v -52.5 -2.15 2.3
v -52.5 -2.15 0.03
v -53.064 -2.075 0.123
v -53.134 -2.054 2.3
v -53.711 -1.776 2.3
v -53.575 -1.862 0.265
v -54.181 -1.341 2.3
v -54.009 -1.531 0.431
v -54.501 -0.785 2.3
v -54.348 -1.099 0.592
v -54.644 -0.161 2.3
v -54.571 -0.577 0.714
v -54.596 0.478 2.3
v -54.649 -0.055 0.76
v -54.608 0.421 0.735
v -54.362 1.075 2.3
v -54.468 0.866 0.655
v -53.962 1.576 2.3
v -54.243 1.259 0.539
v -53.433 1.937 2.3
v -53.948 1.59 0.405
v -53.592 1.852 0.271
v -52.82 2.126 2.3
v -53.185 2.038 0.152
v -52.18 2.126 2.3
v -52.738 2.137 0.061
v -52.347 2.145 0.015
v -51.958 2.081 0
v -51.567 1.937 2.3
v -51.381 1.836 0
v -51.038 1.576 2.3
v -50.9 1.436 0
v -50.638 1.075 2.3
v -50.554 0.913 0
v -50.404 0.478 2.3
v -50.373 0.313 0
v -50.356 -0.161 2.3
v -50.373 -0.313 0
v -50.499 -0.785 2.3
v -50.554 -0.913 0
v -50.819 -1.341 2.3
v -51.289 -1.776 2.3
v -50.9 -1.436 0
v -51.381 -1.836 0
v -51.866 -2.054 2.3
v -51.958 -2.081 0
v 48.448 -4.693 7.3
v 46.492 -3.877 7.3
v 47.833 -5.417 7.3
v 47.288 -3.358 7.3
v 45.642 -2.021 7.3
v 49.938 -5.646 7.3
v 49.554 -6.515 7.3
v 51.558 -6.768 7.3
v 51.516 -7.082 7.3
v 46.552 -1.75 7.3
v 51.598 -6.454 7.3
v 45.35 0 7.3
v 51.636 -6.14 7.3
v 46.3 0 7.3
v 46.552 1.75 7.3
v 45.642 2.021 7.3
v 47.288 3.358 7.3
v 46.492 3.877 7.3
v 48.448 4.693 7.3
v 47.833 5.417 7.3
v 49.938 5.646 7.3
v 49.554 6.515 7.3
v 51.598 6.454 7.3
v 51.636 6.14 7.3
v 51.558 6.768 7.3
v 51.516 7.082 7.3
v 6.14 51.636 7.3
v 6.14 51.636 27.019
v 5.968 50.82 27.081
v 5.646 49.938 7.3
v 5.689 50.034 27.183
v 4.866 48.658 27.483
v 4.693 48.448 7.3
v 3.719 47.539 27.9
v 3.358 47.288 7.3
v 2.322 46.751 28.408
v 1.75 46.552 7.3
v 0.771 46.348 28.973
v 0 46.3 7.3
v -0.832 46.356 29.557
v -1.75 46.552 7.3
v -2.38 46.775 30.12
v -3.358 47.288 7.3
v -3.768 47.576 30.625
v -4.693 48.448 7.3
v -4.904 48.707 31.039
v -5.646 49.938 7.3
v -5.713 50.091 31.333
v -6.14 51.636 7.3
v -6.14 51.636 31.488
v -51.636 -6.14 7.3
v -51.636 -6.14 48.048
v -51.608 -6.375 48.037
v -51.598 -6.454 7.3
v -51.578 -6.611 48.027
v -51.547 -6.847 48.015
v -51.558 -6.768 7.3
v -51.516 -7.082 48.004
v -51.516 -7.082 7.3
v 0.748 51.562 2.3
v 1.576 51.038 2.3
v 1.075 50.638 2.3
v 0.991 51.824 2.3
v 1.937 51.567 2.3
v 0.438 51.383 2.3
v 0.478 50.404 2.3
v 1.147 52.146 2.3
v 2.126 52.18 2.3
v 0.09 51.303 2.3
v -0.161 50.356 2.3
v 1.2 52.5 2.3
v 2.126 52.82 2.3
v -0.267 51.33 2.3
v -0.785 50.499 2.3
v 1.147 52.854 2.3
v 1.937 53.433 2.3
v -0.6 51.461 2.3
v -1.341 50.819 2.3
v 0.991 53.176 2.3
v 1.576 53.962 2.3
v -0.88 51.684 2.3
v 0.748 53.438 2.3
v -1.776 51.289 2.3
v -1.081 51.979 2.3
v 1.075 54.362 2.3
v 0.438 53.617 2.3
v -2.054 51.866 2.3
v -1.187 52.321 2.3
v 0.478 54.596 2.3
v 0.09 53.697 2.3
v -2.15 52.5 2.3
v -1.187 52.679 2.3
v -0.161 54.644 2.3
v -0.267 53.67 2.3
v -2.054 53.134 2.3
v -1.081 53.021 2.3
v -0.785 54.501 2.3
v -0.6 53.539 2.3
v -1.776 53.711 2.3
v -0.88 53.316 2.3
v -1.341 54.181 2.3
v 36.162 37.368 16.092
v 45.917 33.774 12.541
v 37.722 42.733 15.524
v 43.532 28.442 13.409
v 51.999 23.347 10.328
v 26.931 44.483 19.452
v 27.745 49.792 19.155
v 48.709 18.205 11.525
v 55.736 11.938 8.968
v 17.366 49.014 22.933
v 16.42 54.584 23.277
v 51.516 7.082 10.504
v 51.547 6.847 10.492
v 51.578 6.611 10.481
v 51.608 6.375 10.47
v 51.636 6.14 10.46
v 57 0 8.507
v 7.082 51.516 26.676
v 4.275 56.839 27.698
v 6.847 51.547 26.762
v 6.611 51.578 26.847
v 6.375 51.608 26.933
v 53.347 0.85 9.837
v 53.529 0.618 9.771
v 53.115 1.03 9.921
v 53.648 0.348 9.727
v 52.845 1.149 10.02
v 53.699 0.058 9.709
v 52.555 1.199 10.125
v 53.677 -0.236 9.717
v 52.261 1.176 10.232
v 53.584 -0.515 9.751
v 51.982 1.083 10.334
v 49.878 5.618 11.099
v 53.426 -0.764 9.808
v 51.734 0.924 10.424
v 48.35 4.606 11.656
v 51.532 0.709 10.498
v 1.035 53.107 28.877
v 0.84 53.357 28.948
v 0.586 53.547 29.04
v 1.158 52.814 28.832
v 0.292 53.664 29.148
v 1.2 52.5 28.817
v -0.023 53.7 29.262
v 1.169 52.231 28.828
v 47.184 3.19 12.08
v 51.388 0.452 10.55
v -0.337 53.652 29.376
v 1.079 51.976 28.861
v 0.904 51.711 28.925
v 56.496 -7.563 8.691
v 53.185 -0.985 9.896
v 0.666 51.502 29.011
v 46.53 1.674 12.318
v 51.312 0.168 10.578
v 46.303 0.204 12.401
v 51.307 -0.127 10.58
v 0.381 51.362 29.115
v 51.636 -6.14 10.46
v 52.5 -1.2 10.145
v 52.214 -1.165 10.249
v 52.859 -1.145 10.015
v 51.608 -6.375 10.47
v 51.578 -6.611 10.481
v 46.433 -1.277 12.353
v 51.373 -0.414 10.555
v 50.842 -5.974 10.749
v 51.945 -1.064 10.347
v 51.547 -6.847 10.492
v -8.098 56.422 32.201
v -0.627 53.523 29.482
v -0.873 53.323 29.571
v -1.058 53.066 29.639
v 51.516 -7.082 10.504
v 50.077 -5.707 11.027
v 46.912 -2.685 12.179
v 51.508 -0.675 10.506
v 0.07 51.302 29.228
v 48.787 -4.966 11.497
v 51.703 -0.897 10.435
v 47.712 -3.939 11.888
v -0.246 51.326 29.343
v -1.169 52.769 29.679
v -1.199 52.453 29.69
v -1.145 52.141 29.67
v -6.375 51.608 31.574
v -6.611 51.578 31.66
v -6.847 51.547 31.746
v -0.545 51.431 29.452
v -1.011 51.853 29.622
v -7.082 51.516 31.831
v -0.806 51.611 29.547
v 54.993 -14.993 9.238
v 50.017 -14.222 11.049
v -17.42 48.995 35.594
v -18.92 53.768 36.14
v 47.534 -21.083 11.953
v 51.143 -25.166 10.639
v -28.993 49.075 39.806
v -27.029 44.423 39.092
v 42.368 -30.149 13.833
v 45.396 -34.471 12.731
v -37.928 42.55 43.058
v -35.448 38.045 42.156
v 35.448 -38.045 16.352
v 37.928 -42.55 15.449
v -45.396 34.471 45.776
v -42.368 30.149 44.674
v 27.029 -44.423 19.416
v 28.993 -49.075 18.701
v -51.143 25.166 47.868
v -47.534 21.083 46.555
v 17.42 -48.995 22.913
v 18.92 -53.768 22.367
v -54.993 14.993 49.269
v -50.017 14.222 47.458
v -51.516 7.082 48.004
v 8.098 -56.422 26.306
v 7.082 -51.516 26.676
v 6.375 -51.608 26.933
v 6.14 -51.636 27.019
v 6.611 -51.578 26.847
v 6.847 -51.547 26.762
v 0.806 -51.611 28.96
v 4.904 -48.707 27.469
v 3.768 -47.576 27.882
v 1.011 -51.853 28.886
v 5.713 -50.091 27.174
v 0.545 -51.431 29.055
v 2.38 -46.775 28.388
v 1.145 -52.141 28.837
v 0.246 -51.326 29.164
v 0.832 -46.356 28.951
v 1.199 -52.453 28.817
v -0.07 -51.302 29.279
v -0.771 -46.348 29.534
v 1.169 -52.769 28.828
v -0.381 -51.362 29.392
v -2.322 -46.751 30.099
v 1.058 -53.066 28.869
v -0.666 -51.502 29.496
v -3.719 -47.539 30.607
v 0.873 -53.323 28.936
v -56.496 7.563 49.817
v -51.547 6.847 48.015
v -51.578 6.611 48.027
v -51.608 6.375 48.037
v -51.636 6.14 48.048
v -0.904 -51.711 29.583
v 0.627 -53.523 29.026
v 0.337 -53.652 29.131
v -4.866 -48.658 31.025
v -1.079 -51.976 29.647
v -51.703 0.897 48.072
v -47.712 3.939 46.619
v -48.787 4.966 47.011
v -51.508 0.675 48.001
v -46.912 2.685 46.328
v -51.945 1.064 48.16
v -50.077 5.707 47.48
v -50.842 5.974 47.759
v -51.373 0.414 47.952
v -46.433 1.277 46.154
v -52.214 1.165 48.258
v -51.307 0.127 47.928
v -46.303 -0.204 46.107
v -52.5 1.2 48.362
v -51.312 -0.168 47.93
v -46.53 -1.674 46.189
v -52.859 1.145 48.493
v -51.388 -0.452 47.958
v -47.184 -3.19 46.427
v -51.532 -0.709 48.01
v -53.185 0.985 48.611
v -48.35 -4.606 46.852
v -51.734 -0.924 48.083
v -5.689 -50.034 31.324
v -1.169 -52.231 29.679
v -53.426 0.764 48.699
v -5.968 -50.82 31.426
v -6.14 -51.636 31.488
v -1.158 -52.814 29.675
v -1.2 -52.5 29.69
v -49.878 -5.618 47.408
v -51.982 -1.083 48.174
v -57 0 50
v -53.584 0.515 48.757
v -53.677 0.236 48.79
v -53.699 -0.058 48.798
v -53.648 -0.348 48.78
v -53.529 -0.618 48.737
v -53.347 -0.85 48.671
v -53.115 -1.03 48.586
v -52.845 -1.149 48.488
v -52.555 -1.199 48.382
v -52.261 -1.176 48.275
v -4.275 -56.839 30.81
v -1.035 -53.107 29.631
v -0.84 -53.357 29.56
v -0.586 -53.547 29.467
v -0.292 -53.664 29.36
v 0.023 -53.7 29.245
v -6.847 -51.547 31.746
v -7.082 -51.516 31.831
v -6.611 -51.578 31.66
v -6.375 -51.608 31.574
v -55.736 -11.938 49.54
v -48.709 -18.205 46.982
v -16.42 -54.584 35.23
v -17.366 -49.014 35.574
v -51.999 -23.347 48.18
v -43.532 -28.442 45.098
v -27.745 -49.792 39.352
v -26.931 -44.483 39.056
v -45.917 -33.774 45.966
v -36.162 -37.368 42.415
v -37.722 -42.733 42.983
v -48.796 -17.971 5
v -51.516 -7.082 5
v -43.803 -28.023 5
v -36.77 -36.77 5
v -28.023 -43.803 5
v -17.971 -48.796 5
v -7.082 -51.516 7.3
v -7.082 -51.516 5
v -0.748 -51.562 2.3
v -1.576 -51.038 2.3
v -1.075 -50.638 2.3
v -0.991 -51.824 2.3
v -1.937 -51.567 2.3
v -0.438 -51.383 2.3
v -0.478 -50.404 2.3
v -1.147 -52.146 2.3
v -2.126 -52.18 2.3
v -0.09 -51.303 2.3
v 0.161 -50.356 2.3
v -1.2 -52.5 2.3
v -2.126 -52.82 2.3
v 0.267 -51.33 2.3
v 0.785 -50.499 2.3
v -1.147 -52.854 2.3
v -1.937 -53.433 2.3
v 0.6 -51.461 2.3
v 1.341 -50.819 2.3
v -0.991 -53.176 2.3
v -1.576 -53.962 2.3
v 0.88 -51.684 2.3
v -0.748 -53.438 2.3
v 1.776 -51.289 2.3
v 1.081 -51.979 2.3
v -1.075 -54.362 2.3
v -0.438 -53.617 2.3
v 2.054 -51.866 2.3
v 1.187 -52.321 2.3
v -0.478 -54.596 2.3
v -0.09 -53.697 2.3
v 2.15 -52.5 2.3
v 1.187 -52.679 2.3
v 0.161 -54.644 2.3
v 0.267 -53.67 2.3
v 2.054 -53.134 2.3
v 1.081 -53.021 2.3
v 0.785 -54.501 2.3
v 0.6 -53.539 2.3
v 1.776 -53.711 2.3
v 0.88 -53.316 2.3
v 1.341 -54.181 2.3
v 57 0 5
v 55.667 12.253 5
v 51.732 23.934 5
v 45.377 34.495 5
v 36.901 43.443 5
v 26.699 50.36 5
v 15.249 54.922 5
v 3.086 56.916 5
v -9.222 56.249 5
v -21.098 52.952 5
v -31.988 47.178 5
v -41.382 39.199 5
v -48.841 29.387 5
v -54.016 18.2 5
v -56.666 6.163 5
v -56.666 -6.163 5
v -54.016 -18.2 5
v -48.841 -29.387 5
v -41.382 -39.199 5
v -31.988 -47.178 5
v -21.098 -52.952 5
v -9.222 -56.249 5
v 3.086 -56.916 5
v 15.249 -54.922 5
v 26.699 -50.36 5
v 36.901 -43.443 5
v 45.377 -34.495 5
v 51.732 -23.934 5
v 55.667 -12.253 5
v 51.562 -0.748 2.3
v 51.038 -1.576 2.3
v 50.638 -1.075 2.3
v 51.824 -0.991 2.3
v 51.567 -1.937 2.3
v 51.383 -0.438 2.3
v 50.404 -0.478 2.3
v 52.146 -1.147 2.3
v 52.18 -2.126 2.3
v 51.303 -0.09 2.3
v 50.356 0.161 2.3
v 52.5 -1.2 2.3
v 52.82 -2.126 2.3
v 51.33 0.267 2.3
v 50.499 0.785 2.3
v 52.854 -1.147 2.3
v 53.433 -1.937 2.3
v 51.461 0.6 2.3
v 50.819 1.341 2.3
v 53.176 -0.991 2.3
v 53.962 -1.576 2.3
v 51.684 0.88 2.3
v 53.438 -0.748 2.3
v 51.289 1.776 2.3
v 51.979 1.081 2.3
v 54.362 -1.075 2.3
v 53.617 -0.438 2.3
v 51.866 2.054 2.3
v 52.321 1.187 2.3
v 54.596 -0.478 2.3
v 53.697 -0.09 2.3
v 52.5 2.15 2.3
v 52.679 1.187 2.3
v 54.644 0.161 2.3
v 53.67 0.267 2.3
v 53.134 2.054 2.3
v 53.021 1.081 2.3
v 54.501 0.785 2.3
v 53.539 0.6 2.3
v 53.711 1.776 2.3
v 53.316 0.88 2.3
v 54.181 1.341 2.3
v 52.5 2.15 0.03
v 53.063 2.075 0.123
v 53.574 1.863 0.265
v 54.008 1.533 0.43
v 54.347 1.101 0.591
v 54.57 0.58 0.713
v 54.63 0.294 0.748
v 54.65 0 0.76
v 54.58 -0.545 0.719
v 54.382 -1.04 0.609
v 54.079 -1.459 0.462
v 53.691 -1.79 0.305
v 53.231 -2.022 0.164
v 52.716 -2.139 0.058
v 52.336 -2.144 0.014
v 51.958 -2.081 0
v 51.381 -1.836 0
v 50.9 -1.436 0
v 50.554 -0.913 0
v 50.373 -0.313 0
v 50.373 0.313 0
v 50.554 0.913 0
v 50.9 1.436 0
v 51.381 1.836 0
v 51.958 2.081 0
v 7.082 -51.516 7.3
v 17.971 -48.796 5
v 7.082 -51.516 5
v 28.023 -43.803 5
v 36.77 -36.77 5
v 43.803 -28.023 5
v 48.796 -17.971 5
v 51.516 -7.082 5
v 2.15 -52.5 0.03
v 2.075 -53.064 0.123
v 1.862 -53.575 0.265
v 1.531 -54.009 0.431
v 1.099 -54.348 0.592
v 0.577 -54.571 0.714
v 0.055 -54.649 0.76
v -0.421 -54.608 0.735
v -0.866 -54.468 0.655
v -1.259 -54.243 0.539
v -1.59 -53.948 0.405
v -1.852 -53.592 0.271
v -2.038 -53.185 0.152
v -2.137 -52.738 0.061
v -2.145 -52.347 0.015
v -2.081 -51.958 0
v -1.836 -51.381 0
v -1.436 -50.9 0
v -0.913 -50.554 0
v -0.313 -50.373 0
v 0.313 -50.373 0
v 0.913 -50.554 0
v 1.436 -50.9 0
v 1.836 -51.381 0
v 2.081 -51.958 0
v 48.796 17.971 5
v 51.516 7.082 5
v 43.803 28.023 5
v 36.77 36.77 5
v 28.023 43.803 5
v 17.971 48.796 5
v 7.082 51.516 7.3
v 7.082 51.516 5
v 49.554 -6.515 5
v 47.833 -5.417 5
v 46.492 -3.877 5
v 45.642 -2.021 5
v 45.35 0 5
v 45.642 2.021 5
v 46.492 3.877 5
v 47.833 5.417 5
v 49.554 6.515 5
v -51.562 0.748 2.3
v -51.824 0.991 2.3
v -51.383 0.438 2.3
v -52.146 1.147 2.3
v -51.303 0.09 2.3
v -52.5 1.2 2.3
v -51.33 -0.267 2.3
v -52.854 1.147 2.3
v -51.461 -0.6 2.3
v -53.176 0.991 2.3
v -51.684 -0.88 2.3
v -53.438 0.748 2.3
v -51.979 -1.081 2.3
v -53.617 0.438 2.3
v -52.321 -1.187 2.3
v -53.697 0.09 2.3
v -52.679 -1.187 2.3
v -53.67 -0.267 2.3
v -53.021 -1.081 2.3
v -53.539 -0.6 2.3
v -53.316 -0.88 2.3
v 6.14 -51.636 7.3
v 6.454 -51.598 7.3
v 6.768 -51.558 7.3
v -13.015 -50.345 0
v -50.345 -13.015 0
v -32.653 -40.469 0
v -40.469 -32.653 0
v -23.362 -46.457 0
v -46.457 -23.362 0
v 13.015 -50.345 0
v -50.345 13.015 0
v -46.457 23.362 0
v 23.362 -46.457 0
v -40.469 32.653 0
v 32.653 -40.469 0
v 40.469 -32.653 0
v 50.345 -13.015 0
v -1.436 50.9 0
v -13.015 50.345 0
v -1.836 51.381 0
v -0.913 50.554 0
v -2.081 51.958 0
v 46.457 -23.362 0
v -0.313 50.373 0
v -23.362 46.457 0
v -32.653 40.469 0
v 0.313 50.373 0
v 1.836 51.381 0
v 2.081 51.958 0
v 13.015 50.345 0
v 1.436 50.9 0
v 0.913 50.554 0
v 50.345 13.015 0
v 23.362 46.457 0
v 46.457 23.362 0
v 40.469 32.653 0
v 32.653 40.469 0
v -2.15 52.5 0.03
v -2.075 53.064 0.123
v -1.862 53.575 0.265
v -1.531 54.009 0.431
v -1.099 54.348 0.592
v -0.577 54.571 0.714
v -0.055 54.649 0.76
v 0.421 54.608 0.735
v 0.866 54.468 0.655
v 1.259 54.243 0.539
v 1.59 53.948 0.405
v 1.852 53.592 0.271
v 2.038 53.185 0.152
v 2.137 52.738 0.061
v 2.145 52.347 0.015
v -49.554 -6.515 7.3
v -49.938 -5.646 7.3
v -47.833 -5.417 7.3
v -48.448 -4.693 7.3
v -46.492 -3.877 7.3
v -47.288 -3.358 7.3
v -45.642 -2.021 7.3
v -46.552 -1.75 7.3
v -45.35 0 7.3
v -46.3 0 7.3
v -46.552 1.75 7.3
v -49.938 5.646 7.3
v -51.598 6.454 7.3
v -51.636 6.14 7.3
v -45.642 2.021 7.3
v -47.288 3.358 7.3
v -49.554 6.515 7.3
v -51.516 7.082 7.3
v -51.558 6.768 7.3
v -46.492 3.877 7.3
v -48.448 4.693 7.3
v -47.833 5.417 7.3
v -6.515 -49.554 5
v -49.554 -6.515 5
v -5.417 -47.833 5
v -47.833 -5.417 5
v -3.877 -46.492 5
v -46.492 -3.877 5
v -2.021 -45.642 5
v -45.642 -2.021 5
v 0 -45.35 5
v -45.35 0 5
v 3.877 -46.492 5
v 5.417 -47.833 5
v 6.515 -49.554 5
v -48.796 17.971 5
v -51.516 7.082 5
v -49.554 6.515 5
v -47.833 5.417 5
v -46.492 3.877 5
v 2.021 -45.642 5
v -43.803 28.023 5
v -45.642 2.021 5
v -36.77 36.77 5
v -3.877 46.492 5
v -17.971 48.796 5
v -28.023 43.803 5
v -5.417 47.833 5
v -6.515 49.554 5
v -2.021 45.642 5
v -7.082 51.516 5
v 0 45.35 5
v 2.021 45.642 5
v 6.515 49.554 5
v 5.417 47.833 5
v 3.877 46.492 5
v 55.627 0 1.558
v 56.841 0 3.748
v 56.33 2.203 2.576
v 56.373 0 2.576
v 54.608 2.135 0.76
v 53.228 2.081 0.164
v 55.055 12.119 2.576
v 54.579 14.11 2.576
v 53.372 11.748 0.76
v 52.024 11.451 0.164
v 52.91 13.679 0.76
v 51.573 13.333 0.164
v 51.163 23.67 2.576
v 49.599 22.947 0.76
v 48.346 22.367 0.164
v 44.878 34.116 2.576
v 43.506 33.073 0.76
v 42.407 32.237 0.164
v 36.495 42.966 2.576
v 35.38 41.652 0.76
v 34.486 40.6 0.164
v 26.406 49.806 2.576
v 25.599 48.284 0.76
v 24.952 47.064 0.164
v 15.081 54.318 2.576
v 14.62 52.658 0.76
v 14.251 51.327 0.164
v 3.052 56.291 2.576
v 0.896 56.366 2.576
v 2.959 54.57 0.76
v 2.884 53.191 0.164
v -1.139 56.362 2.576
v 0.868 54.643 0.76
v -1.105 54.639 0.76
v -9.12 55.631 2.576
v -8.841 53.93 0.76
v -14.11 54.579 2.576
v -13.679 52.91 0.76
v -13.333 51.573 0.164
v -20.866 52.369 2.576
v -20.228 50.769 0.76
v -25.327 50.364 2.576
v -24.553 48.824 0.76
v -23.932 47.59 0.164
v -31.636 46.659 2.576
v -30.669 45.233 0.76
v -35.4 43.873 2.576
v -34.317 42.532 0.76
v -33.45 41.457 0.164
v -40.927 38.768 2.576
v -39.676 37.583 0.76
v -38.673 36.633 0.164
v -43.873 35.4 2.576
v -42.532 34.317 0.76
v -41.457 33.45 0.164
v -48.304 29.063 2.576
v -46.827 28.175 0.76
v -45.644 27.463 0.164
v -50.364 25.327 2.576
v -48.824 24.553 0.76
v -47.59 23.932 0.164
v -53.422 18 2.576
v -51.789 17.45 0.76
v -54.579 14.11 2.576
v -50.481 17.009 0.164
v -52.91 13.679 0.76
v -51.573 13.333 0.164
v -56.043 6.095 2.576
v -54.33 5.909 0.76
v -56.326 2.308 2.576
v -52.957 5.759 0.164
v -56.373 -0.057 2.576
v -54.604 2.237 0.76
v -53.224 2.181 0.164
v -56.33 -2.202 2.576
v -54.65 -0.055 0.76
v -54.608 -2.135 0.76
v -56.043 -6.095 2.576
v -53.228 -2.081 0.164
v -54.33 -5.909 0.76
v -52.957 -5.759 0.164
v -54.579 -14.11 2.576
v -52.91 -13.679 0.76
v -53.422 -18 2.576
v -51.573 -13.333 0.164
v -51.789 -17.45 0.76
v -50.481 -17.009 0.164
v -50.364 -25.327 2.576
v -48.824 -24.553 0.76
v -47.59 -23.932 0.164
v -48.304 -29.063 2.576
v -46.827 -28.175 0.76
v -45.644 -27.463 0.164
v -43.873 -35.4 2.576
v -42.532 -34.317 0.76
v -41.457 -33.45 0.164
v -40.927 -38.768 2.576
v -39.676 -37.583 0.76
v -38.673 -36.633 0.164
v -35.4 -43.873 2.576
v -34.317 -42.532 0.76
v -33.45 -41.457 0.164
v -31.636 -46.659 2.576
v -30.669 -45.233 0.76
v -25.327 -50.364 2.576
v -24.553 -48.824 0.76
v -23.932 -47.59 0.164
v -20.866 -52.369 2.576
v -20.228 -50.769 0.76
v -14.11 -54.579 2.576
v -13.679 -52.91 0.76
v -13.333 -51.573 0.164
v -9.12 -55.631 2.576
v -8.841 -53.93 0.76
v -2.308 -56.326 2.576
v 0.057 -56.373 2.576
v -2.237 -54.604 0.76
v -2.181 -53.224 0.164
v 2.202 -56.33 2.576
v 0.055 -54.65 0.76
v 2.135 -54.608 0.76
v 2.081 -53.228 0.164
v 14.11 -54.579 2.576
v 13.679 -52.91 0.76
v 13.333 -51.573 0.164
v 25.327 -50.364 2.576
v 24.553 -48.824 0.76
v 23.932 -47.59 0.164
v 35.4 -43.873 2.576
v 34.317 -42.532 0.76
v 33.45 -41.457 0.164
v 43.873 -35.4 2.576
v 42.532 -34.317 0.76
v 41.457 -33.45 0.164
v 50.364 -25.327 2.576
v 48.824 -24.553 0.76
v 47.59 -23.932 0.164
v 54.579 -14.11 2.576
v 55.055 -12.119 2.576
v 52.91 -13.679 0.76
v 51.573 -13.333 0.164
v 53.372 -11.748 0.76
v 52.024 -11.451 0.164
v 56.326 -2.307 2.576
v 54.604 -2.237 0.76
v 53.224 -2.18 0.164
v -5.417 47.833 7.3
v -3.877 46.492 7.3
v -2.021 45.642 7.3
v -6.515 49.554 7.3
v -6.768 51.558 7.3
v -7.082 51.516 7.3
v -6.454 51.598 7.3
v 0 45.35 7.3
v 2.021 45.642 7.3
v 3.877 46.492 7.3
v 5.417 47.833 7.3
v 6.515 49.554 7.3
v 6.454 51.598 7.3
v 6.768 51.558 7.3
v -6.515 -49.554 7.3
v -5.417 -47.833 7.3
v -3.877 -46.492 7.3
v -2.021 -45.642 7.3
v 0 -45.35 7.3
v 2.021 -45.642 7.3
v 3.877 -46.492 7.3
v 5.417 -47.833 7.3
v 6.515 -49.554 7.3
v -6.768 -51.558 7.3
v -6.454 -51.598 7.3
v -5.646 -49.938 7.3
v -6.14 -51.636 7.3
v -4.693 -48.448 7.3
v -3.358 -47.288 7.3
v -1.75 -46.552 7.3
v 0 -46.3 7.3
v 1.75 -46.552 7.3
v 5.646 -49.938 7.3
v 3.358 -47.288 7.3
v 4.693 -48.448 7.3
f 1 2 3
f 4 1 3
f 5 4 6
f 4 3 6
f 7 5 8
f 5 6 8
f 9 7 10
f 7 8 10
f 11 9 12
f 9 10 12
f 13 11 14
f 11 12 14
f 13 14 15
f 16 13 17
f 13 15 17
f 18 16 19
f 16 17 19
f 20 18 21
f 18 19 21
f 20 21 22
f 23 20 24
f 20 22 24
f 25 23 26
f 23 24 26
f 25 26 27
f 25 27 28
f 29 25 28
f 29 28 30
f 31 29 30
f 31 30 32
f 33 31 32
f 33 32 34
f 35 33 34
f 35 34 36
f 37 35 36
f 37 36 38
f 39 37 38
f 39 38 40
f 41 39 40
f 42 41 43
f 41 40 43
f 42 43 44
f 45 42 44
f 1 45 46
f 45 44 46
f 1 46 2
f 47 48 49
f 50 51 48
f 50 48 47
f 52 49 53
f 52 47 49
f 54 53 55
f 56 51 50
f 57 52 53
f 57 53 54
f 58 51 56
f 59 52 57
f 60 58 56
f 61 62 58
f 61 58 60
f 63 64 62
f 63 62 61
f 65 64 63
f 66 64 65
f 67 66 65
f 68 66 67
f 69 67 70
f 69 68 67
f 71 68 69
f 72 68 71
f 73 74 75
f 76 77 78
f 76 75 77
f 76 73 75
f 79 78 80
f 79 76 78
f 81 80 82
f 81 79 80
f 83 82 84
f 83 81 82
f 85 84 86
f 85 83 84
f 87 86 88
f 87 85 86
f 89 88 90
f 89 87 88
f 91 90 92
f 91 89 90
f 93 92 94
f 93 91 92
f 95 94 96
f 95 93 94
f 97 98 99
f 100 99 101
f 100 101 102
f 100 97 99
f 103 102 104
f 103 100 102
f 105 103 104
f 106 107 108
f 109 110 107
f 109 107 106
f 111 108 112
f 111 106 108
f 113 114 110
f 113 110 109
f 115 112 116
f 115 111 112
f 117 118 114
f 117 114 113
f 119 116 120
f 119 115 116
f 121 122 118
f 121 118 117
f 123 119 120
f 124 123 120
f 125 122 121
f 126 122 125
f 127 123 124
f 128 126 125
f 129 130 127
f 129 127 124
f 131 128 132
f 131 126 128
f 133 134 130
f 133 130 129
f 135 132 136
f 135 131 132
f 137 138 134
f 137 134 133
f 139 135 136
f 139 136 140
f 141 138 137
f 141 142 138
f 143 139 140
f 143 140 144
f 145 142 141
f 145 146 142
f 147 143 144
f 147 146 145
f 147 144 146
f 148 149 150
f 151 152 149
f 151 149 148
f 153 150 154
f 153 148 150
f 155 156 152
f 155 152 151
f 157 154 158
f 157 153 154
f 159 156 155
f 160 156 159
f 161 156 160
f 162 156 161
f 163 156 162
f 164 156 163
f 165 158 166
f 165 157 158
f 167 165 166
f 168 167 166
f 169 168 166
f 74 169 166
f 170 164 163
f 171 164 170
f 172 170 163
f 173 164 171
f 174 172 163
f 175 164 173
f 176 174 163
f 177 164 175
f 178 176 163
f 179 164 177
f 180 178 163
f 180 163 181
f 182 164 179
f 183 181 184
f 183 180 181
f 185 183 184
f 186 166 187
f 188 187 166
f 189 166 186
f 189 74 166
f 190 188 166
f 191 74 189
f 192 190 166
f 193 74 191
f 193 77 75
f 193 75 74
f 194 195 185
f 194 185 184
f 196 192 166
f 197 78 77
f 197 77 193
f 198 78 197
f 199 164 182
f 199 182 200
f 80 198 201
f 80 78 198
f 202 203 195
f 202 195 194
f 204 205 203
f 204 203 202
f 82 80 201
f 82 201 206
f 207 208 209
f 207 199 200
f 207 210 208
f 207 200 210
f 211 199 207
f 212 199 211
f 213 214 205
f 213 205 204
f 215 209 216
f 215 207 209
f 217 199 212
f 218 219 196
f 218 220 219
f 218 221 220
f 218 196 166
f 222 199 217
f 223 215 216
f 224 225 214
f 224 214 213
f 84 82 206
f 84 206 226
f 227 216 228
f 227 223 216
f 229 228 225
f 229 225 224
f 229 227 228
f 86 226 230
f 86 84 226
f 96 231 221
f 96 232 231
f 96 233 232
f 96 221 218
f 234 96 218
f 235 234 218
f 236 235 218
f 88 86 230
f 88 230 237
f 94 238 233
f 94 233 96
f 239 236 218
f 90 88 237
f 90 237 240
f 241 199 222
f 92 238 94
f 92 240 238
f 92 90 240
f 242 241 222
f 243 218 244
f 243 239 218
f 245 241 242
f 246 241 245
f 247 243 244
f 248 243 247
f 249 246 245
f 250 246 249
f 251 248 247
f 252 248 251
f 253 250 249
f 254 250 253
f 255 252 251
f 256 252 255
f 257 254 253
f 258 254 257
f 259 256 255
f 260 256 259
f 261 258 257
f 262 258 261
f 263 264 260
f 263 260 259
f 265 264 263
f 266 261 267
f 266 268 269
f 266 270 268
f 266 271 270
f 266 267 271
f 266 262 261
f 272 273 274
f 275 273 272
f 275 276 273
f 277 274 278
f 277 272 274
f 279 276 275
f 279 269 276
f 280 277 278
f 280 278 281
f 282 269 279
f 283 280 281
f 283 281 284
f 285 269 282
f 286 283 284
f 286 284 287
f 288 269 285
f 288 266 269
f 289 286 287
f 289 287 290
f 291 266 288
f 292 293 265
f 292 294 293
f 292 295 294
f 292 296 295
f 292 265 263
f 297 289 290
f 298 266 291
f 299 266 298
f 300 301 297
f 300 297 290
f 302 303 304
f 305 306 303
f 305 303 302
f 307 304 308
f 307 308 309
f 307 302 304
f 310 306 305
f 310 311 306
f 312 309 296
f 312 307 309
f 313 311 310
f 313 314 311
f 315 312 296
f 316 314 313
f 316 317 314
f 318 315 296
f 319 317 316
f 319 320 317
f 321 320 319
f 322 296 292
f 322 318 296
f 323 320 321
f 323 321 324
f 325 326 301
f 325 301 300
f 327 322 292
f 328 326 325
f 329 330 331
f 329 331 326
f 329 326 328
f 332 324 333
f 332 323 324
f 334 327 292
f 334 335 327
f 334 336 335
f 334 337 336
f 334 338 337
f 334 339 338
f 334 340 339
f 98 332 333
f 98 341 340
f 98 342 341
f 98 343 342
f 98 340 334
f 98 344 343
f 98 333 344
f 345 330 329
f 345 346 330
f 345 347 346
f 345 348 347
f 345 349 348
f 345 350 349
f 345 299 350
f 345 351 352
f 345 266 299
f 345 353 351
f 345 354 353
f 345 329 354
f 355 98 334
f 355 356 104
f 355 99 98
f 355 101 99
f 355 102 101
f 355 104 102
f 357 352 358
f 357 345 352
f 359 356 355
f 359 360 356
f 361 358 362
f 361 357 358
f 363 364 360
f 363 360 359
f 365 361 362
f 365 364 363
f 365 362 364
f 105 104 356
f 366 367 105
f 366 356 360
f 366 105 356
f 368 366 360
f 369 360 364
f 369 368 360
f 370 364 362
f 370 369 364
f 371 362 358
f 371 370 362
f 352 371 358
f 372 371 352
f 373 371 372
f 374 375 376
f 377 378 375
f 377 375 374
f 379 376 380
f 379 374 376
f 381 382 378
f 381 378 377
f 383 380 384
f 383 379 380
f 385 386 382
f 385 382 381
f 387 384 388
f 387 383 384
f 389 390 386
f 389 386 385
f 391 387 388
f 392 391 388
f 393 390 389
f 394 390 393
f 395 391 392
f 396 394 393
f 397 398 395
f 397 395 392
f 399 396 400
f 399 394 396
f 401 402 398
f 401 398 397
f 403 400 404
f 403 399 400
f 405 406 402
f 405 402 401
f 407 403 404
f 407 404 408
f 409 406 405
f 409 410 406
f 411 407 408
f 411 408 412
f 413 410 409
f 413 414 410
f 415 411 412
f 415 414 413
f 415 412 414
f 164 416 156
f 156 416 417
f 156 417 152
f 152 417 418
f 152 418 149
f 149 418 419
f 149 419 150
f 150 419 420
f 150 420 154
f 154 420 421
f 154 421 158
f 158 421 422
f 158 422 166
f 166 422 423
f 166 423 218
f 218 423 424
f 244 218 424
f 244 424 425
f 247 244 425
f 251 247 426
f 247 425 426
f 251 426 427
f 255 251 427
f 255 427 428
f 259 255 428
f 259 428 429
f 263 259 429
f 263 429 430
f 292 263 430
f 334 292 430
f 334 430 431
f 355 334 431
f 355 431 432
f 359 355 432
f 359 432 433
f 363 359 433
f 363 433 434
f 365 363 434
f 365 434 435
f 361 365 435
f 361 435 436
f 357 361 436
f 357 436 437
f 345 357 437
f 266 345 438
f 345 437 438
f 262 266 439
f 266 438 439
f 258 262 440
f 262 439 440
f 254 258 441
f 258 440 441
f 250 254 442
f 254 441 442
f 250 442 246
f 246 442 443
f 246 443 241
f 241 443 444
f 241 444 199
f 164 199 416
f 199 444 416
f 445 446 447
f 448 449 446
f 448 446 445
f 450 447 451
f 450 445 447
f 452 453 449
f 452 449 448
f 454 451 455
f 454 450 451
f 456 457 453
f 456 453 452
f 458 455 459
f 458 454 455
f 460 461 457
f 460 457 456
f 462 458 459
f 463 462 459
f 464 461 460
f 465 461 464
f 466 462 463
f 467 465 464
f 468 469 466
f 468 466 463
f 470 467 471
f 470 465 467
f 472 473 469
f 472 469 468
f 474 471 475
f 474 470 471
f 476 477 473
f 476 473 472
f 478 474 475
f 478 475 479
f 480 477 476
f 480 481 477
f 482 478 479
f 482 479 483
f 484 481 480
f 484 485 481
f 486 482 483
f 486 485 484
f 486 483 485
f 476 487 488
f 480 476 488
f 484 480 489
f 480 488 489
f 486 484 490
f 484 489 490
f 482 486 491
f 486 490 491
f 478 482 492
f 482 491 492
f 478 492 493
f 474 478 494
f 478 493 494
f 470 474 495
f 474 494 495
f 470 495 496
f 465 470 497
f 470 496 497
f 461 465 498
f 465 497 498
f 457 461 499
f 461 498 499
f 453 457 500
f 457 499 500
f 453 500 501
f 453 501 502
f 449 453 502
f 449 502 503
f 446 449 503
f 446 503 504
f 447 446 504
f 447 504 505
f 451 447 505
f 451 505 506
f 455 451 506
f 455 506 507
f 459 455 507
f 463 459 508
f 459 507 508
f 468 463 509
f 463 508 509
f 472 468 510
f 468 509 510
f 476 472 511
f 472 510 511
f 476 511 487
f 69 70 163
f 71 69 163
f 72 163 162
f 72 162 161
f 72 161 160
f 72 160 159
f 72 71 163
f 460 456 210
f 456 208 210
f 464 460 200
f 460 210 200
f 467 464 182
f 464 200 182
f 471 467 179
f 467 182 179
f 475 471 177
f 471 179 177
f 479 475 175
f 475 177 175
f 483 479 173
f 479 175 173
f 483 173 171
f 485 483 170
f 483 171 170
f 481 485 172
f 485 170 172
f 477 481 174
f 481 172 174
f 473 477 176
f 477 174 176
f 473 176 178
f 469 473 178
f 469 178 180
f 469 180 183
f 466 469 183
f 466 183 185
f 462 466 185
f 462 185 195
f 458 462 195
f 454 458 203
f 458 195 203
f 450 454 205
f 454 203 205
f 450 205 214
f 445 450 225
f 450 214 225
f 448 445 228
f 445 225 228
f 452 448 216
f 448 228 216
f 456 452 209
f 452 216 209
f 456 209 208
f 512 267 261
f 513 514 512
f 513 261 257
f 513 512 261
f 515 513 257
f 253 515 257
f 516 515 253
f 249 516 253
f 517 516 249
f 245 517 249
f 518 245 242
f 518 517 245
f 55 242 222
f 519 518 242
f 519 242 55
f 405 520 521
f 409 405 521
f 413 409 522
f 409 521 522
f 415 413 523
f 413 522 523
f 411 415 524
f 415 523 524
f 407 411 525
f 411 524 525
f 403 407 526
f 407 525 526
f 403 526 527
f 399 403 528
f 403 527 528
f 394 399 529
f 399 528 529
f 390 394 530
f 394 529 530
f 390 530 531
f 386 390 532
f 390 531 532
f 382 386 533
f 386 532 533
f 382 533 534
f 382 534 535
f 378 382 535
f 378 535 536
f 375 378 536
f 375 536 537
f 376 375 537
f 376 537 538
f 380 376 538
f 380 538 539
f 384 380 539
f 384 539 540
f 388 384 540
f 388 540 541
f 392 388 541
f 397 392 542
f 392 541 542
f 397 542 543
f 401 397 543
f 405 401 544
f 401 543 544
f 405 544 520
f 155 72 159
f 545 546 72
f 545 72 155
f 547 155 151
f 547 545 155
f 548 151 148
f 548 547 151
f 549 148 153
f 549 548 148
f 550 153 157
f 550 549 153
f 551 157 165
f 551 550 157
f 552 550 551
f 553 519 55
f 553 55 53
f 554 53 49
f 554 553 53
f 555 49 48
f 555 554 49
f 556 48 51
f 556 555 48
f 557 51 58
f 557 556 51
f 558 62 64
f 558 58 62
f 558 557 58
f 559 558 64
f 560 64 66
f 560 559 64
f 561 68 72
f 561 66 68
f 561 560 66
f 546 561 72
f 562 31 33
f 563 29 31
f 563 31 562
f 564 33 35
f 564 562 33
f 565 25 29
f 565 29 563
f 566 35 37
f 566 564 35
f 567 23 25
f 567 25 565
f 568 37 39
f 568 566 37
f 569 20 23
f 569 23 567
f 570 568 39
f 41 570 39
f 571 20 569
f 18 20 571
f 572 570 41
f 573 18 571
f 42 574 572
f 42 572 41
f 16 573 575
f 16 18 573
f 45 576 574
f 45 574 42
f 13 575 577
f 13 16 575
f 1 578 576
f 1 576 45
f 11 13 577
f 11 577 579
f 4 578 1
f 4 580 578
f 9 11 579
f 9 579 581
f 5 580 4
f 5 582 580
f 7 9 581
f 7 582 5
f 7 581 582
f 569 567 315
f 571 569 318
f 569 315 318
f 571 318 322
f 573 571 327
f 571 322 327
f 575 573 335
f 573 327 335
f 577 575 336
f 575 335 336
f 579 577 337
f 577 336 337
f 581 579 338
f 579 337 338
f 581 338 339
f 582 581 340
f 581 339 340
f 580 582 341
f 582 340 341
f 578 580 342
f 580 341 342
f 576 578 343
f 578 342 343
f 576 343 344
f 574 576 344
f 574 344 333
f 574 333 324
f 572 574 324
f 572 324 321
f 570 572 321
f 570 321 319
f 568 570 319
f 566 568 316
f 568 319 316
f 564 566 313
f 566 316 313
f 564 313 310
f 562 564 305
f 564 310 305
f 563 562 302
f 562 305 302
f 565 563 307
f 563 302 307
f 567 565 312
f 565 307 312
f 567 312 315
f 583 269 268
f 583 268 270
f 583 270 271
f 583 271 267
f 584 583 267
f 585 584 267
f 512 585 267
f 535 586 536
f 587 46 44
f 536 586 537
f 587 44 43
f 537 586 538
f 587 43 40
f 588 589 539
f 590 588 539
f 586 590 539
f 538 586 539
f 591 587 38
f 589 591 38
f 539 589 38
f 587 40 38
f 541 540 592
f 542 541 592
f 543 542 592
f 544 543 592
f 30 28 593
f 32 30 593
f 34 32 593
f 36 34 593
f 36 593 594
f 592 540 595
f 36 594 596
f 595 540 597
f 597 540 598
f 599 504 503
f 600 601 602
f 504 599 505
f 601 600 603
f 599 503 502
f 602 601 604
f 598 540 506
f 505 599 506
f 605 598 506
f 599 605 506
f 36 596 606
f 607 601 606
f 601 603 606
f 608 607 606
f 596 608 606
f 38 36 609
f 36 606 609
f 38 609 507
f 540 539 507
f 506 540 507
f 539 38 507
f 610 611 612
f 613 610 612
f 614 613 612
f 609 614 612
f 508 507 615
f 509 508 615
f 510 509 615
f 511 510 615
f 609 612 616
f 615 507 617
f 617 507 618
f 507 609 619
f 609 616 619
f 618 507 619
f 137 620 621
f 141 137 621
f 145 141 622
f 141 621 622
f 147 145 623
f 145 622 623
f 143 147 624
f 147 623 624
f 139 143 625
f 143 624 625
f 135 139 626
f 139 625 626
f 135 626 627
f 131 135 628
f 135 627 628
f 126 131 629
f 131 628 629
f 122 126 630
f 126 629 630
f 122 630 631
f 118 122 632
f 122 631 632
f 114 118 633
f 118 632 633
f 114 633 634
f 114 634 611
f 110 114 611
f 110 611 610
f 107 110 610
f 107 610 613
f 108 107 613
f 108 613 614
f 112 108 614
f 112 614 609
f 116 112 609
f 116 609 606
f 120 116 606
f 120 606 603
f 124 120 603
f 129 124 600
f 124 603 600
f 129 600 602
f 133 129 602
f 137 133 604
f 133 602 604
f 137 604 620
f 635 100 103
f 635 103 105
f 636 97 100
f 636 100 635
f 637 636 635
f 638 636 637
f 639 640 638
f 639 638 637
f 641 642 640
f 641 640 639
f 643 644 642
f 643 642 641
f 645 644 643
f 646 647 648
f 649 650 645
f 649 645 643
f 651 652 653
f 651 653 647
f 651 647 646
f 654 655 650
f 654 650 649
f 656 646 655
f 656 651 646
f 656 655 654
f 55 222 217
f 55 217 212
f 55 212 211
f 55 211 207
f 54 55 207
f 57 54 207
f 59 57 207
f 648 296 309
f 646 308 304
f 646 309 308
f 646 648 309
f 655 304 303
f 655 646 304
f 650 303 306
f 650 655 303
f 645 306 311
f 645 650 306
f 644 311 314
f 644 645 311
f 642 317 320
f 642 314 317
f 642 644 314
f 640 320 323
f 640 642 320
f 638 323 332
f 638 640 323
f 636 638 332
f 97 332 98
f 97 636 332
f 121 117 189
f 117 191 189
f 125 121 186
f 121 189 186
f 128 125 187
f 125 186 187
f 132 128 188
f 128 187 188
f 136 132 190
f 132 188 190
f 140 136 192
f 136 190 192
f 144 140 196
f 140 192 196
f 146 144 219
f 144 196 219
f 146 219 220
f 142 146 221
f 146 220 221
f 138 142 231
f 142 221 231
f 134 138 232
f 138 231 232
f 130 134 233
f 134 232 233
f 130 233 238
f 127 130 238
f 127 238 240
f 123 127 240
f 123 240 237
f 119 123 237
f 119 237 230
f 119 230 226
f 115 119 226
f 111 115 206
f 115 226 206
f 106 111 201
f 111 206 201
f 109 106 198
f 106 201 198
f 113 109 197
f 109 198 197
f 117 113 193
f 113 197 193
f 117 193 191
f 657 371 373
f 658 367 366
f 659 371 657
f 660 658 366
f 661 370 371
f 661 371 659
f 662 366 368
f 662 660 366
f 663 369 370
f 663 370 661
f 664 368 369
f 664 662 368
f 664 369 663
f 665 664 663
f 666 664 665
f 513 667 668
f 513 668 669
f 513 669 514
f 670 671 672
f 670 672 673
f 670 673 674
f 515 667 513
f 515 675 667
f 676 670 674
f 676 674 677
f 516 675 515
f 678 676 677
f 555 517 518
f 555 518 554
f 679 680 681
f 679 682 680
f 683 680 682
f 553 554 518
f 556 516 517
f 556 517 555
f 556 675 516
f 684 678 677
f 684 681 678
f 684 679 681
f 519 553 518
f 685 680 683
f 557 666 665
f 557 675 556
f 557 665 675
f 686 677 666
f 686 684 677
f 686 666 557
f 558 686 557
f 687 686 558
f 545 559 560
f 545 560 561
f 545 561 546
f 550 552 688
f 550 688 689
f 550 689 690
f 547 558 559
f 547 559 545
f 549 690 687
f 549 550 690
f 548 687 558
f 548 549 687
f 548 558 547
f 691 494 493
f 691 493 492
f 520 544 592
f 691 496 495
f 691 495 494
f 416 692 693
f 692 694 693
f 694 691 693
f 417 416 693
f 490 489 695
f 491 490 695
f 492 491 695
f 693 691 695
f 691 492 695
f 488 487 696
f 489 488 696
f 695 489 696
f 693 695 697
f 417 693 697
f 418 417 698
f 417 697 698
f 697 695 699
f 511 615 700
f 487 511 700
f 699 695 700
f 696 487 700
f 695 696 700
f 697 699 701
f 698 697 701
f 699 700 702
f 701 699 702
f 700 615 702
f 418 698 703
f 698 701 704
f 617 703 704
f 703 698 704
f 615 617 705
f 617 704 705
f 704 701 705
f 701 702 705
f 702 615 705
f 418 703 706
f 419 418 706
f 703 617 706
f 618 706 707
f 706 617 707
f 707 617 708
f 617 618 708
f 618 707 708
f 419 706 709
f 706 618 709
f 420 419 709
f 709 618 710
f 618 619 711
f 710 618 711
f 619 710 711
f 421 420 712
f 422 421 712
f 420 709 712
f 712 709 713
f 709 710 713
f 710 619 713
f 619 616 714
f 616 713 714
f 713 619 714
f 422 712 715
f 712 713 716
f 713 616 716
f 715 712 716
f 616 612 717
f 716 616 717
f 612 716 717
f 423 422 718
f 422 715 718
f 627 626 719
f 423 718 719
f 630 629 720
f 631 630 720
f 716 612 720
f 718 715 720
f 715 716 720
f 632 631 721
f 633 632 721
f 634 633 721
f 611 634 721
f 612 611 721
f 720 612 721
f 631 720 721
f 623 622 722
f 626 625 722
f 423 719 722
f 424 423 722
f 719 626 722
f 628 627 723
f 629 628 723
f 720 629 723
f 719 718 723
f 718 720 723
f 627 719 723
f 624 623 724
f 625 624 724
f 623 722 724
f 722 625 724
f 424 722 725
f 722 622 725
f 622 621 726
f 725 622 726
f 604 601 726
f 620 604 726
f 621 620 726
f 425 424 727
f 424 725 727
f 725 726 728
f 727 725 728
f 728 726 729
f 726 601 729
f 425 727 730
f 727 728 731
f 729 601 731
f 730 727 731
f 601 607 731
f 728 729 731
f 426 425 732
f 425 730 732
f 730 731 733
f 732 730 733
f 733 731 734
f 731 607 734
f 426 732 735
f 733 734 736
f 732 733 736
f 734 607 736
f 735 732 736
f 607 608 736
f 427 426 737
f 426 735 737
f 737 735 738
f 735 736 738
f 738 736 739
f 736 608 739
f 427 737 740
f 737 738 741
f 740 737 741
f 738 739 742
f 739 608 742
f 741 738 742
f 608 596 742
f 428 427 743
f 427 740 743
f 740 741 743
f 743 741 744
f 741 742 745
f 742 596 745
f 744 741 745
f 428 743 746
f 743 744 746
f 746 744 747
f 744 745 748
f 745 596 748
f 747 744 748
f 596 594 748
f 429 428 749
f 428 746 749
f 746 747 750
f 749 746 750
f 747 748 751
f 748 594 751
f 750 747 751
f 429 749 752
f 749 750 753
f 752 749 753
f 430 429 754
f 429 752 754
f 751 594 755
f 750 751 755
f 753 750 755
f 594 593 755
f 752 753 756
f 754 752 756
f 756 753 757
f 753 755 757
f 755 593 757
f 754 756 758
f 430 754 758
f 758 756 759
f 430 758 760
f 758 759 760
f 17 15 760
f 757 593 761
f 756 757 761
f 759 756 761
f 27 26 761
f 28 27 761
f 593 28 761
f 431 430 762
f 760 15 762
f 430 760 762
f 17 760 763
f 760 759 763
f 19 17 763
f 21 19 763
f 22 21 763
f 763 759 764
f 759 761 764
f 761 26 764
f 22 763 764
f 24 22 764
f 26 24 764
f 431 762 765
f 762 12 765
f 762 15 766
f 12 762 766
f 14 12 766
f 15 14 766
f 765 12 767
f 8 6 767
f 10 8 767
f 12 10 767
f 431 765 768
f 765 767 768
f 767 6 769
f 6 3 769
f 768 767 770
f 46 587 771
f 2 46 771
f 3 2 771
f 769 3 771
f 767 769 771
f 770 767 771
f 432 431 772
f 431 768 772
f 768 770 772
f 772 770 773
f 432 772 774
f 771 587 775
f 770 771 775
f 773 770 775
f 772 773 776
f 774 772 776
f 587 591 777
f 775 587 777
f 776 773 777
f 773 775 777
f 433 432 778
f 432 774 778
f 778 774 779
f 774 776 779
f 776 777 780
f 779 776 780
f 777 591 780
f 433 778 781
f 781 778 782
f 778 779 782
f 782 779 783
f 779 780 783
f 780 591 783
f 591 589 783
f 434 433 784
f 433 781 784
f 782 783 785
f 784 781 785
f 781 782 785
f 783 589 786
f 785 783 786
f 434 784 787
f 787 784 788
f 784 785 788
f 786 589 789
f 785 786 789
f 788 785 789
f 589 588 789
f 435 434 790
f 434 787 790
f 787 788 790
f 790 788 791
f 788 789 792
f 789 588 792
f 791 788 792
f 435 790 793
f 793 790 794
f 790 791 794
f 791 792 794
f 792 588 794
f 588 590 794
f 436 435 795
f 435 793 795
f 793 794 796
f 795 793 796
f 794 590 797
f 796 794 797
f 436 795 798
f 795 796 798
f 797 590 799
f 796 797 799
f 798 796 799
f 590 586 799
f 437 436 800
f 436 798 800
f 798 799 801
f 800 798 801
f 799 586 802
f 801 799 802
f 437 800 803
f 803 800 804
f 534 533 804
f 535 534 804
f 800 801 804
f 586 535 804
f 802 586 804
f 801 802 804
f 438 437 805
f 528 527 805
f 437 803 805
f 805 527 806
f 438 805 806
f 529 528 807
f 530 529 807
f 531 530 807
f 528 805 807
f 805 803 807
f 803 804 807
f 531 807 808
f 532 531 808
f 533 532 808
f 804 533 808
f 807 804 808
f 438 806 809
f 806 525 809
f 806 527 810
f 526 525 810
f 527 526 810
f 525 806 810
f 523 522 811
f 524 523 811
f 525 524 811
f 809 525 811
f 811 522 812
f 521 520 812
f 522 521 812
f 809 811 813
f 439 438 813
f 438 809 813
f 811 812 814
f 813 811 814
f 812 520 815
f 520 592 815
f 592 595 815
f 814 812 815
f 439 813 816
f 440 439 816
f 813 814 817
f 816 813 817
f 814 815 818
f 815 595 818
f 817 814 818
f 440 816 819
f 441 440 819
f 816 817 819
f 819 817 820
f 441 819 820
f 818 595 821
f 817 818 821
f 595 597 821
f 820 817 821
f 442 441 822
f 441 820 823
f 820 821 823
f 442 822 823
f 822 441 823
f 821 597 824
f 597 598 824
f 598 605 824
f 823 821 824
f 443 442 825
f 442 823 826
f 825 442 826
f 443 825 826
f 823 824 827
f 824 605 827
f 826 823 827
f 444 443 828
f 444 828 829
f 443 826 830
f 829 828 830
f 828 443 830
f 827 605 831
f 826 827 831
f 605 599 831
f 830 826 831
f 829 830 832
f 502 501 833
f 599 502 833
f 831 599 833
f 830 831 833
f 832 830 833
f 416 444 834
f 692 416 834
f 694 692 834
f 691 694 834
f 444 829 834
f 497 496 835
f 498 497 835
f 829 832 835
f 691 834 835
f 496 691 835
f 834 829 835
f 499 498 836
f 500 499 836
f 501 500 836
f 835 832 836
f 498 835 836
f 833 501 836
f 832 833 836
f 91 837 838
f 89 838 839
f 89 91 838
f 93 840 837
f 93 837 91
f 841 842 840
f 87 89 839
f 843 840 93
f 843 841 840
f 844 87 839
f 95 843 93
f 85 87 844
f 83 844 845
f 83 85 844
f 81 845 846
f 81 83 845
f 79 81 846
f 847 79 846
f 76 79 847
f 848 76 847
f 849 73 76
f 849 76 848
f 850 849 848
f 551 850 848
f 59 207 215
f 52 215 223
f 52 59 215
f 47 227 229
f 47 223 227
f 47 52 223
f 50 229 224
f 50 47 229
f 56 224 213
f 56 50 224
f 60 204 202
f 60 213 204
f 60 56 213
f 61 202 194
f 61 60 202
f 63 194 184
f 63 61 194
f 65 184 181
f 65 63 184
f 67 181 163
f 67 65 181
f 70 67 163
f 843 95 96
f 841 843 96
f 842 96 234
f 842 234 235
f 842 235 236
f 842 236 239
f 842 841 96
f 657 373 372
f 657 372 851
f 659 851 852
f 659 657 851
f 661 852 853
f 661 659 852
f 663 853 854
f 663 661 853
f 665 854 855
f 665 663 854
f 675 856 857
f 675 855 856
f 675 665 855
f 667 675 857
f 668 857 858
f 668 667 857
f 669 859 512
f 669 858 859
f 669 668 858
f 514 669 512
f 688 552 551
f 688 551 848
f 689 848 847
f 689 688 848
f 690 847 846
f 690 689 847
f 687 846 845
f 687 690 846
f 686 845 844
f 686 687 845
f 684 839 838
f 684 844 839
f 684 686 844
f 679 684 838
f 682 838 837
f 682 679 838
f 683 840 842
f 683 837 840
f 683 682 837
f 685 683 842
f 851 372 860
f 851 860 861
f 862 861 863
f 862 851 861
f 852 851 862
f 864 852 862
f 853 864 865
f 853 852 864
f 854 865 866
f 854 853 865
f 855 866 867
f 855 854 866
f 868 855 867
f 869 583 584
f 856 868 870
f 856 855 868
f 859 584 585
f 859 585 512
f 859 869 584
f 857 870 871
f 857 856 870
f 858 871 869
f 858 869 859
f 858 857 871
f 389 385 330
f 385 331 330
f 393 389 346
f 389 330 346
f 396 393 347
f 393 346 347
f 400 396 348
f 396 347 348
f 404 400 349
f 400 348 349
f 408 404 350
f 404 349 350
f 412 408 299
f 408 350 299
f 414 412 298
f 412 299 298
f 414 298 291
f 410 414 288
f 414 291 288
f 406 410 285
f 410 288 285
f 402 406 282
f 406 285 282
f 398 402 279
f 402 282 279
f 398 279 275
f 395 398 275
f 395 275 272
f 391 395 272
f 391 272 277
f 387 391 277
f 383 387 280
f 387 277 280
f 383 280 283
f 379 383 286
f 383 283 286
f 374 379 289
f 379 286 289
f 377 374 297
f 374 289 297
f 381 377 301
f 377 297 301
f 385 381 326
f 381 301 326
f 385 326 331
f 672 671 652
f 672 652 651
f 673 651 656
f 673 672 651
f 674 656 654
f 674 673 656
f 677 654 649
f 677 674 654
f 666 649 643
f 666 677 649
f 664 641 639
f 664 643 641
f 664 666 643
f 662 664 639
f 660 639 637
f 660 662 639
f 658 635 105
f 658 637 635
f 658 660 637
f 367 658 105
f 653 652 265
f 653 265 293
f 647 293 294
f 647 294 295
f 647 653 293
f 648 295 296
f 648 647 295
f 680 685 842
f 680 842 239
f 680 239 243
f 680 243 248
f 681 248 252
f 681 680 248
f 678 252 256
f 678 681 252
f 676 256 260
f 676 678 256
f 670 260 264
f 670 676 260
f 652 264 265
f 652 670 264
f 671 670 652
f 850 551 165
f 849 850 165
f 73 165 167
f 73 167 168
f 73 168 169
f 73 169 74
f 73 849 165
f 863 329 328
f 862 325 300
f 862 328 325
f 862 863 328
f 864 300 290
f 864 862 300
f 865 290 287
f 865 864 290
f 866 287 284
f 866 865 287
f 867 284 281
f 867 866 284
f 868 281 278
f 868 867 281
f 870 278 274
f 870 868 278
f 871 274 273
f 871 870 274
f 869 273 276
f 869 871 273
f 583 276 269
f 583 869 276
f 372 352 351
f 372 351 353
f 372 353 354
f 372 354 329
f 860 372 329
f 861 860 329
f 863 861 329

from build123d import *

# Parameters (mm, degrees)
SKETCH_1_R                = 57
EXTRUDE_1_DEPTH           = 50
CUT_EXTRUDE_1_DEPTH       = 95.857788294
CUT_EXTRUDE_1_DEPTH_BACK  = 95.857788294
FILLET_1_R                = 5
HOLE_WIZARD_1_D           = 2.4
HOLE_WIZARD_1_CBORE_D     = 4.3
HOLE_WIZARD_1_CBORE_DEPTH = 2.3
PATTERN_CIRCULAR_1_COUNT  = 4
SHELL_START               = 5
SHELL_1_DEPTH             = 43.047767655
SHELL_START_2             = 7.3
SHELL_1_2_DEPTH           = 40.747767655


# Read off the part's stored shape, not the designer's step: 抽壳1
with BuildPart() as part:
    # 草图1 → 凸台-拉伸1 (new body)
    with BuildSketch(Plane.XY):
        Circle(SKETCH_1_R)
    extrude(amount=EXTRUDE_1_DEPTH)

    # 草图2 → 切除-拉伸1 (cut, two sides: drawn at the far end of the back side and taken through both)
    with BuildSketch(Plane(origin=(0, 0, 0), x_dir=(1, 0, 0), z_dir=(0, 1, 0)).offset(-CUT_EXTRUDE_1_DEPTH_BACK)):
        Polygon((-57, -50), (57, -50), (57, -8.507393294), align=None)
    extrude(amount=CUT_EXTRUDE_1_DEPTH + CUT_EXTRUDE_1_DEPTH_BACK, mode=Mode.SUBTRACT)

    # 圆角1
    fillet_1_edges = [part.edges().sort_by_distance(p)[0] for p in [
        (-57, 0, 0),
    ]]
    fillet(fillet_1_edges, radius=FILLET_1_R)

    # 打孔尺寸(%根据)内六角圆柱头螺钉的类型1 (through all)
    with Locations(Plane(origin=(0, 0, 0), x_dir=(-1, 0, 0), z_dir=(0, 0, -1))):
        with Locations((0, 52.5)):
            hole_wizard_1 = CounterBoreHole(HOLE_WIZARD_1_D / 2, HOLE_WIZARD_1_CBORE_D / 2, HOLE_WIZARD_1_CBORE_DEPTH)

    # 阵列(圆周)1: 打孔尺寸(%根据)内六角圆柱头螺钉的类型1 ×4 about axis
    pattern_circular_1_axis = Axis((0, 0, 0), (0, 0, 1))
    for i in range(1, PATTERN_CIRCULAR_1_COUNT):
        add(hole_wizard_1.rotate(pattern_circular_1_axis, i * 360 / PATTERN_CIRCULAR_1_COUNT), mode=Mode.SUBTRACT)

    # 抽壳1 outline → 抽壳1 (cut)
    with BuildSketch(Plane.XY.offset(SHELL_START)):
        with BuildLine():
            ThreePointArc((7.081896621, -51.5155), (36.769552622, -36.769552622), (51.5155, -7.081896621))
            ThreePointArc((51.5155, -7.081896621), (45.35, 0), (51.5155, 7.081896621))
            ThreePointArc((51.5155, 7.081896621), (36.769552622, 36.769552622), (7.081896621, 51.5155))
            ThreePointArc((7.081896621, 51.5155), (0, 45.35), (-7.081896621, 51.5155))
            ThreePointArc((-7.081896621, 51.5155), (-36.769552622, 36.769552622), (-51.5155, 7.081896621))
            ThreePointArc((-51.5155, 7.081896621), (-45.35, 0), (-51.5155, -7.081896621))
            ThreePointArc((-51.5155, -7.081896621), (-36.769552622, -36.769552622), (-7.081896621, -51.5155))
            ThreePointArc((-7.081896621, -51.5155), (0, -45.35), (7.081896621, -51.5155))
        make_face()
    extrude(amount=SHELL_1_DEPTH, mode=Mode.SUBTRACT)

    # Shell 1 2 outline → Shell 1 2 (cut)
    with BuildSketch(Plane.XY.offset(SHELL_START_2)):
        with BuildLine():
            ThreePointArc((51.5155, 7.081896621), (45.35, 0), (51.5155, -7.081896621))
            ThreePointArc((51.5155, -7.081896621), (51.57804505, -6.610996049), (51.636285714, -6.139543764))
            ThreePointArc((51.636285714, -6.139543764), (46.3, 0), (51.636285714, 6.139543764))
            ThreePointArc((51.636285714, 6.139543764), (51.57804505, 6.610996049), (51.5155, 7.081896621))
        make_face()
        with BuildLine():
            ThreePointArc((6.139543764, -51.636285714), (6.610996049, -51.57804505), (7.081896621, -51.5155))
            ThreePointArc((7.081896621, -51.5155), (0, -45.35), (-7.081896621, -51.5155))
            ThreePointArc((-7.081896621, -51.5155), (-6.610996049, -51.57804505), (-6.139543764, -51.636285714))
            ThreePointArc((-6.139543764, -51.636285714), (0, -46.3), (6.139543764, -51.636285714))
        make_face()
        with BuildLine():
            ThreePointArc((-7.081896621, 51.5155), (0, 45.35), (7.081896621, 51.5155))
            ThreePointArc((7.081896621, 51.5155), (6.610996049, 51.57804505), (6.139543764, 51.636285714))
            ThreePointArc((6.139543764, 51.636285714), (0, 46.3), (-6.139543764, 51.636285714))
            ThreePointArc((-6.139543764, 51.636285714), (-6.610996049, 51.57804505), (-7.081896621, 51.5155))
        make_face()
        with BuildLine():
            ThreePointArc((-51.636285714, -6.139543764), (-51.57804505, -6.610996049), (-51.5155, -7.081896621))
            ThreePointArc((-51.5155, -7.081896621), (-45.35, 0), (-51.5155, 7.081896621))
            ThreePointArc((-51.5155, 7.081896621), (-51.57804505, 6.610996049), (-51.636285714, 6.139543764))
            ThreePointArc((-51.636285714, 6.139543764), (-46.3, 0), (-51.636285714, -6.139543764))
        make_face()
    extrude(amount=SHELL_1_2_DEPTH, mode=Mode.SUBTRACT)


solid = part.part
